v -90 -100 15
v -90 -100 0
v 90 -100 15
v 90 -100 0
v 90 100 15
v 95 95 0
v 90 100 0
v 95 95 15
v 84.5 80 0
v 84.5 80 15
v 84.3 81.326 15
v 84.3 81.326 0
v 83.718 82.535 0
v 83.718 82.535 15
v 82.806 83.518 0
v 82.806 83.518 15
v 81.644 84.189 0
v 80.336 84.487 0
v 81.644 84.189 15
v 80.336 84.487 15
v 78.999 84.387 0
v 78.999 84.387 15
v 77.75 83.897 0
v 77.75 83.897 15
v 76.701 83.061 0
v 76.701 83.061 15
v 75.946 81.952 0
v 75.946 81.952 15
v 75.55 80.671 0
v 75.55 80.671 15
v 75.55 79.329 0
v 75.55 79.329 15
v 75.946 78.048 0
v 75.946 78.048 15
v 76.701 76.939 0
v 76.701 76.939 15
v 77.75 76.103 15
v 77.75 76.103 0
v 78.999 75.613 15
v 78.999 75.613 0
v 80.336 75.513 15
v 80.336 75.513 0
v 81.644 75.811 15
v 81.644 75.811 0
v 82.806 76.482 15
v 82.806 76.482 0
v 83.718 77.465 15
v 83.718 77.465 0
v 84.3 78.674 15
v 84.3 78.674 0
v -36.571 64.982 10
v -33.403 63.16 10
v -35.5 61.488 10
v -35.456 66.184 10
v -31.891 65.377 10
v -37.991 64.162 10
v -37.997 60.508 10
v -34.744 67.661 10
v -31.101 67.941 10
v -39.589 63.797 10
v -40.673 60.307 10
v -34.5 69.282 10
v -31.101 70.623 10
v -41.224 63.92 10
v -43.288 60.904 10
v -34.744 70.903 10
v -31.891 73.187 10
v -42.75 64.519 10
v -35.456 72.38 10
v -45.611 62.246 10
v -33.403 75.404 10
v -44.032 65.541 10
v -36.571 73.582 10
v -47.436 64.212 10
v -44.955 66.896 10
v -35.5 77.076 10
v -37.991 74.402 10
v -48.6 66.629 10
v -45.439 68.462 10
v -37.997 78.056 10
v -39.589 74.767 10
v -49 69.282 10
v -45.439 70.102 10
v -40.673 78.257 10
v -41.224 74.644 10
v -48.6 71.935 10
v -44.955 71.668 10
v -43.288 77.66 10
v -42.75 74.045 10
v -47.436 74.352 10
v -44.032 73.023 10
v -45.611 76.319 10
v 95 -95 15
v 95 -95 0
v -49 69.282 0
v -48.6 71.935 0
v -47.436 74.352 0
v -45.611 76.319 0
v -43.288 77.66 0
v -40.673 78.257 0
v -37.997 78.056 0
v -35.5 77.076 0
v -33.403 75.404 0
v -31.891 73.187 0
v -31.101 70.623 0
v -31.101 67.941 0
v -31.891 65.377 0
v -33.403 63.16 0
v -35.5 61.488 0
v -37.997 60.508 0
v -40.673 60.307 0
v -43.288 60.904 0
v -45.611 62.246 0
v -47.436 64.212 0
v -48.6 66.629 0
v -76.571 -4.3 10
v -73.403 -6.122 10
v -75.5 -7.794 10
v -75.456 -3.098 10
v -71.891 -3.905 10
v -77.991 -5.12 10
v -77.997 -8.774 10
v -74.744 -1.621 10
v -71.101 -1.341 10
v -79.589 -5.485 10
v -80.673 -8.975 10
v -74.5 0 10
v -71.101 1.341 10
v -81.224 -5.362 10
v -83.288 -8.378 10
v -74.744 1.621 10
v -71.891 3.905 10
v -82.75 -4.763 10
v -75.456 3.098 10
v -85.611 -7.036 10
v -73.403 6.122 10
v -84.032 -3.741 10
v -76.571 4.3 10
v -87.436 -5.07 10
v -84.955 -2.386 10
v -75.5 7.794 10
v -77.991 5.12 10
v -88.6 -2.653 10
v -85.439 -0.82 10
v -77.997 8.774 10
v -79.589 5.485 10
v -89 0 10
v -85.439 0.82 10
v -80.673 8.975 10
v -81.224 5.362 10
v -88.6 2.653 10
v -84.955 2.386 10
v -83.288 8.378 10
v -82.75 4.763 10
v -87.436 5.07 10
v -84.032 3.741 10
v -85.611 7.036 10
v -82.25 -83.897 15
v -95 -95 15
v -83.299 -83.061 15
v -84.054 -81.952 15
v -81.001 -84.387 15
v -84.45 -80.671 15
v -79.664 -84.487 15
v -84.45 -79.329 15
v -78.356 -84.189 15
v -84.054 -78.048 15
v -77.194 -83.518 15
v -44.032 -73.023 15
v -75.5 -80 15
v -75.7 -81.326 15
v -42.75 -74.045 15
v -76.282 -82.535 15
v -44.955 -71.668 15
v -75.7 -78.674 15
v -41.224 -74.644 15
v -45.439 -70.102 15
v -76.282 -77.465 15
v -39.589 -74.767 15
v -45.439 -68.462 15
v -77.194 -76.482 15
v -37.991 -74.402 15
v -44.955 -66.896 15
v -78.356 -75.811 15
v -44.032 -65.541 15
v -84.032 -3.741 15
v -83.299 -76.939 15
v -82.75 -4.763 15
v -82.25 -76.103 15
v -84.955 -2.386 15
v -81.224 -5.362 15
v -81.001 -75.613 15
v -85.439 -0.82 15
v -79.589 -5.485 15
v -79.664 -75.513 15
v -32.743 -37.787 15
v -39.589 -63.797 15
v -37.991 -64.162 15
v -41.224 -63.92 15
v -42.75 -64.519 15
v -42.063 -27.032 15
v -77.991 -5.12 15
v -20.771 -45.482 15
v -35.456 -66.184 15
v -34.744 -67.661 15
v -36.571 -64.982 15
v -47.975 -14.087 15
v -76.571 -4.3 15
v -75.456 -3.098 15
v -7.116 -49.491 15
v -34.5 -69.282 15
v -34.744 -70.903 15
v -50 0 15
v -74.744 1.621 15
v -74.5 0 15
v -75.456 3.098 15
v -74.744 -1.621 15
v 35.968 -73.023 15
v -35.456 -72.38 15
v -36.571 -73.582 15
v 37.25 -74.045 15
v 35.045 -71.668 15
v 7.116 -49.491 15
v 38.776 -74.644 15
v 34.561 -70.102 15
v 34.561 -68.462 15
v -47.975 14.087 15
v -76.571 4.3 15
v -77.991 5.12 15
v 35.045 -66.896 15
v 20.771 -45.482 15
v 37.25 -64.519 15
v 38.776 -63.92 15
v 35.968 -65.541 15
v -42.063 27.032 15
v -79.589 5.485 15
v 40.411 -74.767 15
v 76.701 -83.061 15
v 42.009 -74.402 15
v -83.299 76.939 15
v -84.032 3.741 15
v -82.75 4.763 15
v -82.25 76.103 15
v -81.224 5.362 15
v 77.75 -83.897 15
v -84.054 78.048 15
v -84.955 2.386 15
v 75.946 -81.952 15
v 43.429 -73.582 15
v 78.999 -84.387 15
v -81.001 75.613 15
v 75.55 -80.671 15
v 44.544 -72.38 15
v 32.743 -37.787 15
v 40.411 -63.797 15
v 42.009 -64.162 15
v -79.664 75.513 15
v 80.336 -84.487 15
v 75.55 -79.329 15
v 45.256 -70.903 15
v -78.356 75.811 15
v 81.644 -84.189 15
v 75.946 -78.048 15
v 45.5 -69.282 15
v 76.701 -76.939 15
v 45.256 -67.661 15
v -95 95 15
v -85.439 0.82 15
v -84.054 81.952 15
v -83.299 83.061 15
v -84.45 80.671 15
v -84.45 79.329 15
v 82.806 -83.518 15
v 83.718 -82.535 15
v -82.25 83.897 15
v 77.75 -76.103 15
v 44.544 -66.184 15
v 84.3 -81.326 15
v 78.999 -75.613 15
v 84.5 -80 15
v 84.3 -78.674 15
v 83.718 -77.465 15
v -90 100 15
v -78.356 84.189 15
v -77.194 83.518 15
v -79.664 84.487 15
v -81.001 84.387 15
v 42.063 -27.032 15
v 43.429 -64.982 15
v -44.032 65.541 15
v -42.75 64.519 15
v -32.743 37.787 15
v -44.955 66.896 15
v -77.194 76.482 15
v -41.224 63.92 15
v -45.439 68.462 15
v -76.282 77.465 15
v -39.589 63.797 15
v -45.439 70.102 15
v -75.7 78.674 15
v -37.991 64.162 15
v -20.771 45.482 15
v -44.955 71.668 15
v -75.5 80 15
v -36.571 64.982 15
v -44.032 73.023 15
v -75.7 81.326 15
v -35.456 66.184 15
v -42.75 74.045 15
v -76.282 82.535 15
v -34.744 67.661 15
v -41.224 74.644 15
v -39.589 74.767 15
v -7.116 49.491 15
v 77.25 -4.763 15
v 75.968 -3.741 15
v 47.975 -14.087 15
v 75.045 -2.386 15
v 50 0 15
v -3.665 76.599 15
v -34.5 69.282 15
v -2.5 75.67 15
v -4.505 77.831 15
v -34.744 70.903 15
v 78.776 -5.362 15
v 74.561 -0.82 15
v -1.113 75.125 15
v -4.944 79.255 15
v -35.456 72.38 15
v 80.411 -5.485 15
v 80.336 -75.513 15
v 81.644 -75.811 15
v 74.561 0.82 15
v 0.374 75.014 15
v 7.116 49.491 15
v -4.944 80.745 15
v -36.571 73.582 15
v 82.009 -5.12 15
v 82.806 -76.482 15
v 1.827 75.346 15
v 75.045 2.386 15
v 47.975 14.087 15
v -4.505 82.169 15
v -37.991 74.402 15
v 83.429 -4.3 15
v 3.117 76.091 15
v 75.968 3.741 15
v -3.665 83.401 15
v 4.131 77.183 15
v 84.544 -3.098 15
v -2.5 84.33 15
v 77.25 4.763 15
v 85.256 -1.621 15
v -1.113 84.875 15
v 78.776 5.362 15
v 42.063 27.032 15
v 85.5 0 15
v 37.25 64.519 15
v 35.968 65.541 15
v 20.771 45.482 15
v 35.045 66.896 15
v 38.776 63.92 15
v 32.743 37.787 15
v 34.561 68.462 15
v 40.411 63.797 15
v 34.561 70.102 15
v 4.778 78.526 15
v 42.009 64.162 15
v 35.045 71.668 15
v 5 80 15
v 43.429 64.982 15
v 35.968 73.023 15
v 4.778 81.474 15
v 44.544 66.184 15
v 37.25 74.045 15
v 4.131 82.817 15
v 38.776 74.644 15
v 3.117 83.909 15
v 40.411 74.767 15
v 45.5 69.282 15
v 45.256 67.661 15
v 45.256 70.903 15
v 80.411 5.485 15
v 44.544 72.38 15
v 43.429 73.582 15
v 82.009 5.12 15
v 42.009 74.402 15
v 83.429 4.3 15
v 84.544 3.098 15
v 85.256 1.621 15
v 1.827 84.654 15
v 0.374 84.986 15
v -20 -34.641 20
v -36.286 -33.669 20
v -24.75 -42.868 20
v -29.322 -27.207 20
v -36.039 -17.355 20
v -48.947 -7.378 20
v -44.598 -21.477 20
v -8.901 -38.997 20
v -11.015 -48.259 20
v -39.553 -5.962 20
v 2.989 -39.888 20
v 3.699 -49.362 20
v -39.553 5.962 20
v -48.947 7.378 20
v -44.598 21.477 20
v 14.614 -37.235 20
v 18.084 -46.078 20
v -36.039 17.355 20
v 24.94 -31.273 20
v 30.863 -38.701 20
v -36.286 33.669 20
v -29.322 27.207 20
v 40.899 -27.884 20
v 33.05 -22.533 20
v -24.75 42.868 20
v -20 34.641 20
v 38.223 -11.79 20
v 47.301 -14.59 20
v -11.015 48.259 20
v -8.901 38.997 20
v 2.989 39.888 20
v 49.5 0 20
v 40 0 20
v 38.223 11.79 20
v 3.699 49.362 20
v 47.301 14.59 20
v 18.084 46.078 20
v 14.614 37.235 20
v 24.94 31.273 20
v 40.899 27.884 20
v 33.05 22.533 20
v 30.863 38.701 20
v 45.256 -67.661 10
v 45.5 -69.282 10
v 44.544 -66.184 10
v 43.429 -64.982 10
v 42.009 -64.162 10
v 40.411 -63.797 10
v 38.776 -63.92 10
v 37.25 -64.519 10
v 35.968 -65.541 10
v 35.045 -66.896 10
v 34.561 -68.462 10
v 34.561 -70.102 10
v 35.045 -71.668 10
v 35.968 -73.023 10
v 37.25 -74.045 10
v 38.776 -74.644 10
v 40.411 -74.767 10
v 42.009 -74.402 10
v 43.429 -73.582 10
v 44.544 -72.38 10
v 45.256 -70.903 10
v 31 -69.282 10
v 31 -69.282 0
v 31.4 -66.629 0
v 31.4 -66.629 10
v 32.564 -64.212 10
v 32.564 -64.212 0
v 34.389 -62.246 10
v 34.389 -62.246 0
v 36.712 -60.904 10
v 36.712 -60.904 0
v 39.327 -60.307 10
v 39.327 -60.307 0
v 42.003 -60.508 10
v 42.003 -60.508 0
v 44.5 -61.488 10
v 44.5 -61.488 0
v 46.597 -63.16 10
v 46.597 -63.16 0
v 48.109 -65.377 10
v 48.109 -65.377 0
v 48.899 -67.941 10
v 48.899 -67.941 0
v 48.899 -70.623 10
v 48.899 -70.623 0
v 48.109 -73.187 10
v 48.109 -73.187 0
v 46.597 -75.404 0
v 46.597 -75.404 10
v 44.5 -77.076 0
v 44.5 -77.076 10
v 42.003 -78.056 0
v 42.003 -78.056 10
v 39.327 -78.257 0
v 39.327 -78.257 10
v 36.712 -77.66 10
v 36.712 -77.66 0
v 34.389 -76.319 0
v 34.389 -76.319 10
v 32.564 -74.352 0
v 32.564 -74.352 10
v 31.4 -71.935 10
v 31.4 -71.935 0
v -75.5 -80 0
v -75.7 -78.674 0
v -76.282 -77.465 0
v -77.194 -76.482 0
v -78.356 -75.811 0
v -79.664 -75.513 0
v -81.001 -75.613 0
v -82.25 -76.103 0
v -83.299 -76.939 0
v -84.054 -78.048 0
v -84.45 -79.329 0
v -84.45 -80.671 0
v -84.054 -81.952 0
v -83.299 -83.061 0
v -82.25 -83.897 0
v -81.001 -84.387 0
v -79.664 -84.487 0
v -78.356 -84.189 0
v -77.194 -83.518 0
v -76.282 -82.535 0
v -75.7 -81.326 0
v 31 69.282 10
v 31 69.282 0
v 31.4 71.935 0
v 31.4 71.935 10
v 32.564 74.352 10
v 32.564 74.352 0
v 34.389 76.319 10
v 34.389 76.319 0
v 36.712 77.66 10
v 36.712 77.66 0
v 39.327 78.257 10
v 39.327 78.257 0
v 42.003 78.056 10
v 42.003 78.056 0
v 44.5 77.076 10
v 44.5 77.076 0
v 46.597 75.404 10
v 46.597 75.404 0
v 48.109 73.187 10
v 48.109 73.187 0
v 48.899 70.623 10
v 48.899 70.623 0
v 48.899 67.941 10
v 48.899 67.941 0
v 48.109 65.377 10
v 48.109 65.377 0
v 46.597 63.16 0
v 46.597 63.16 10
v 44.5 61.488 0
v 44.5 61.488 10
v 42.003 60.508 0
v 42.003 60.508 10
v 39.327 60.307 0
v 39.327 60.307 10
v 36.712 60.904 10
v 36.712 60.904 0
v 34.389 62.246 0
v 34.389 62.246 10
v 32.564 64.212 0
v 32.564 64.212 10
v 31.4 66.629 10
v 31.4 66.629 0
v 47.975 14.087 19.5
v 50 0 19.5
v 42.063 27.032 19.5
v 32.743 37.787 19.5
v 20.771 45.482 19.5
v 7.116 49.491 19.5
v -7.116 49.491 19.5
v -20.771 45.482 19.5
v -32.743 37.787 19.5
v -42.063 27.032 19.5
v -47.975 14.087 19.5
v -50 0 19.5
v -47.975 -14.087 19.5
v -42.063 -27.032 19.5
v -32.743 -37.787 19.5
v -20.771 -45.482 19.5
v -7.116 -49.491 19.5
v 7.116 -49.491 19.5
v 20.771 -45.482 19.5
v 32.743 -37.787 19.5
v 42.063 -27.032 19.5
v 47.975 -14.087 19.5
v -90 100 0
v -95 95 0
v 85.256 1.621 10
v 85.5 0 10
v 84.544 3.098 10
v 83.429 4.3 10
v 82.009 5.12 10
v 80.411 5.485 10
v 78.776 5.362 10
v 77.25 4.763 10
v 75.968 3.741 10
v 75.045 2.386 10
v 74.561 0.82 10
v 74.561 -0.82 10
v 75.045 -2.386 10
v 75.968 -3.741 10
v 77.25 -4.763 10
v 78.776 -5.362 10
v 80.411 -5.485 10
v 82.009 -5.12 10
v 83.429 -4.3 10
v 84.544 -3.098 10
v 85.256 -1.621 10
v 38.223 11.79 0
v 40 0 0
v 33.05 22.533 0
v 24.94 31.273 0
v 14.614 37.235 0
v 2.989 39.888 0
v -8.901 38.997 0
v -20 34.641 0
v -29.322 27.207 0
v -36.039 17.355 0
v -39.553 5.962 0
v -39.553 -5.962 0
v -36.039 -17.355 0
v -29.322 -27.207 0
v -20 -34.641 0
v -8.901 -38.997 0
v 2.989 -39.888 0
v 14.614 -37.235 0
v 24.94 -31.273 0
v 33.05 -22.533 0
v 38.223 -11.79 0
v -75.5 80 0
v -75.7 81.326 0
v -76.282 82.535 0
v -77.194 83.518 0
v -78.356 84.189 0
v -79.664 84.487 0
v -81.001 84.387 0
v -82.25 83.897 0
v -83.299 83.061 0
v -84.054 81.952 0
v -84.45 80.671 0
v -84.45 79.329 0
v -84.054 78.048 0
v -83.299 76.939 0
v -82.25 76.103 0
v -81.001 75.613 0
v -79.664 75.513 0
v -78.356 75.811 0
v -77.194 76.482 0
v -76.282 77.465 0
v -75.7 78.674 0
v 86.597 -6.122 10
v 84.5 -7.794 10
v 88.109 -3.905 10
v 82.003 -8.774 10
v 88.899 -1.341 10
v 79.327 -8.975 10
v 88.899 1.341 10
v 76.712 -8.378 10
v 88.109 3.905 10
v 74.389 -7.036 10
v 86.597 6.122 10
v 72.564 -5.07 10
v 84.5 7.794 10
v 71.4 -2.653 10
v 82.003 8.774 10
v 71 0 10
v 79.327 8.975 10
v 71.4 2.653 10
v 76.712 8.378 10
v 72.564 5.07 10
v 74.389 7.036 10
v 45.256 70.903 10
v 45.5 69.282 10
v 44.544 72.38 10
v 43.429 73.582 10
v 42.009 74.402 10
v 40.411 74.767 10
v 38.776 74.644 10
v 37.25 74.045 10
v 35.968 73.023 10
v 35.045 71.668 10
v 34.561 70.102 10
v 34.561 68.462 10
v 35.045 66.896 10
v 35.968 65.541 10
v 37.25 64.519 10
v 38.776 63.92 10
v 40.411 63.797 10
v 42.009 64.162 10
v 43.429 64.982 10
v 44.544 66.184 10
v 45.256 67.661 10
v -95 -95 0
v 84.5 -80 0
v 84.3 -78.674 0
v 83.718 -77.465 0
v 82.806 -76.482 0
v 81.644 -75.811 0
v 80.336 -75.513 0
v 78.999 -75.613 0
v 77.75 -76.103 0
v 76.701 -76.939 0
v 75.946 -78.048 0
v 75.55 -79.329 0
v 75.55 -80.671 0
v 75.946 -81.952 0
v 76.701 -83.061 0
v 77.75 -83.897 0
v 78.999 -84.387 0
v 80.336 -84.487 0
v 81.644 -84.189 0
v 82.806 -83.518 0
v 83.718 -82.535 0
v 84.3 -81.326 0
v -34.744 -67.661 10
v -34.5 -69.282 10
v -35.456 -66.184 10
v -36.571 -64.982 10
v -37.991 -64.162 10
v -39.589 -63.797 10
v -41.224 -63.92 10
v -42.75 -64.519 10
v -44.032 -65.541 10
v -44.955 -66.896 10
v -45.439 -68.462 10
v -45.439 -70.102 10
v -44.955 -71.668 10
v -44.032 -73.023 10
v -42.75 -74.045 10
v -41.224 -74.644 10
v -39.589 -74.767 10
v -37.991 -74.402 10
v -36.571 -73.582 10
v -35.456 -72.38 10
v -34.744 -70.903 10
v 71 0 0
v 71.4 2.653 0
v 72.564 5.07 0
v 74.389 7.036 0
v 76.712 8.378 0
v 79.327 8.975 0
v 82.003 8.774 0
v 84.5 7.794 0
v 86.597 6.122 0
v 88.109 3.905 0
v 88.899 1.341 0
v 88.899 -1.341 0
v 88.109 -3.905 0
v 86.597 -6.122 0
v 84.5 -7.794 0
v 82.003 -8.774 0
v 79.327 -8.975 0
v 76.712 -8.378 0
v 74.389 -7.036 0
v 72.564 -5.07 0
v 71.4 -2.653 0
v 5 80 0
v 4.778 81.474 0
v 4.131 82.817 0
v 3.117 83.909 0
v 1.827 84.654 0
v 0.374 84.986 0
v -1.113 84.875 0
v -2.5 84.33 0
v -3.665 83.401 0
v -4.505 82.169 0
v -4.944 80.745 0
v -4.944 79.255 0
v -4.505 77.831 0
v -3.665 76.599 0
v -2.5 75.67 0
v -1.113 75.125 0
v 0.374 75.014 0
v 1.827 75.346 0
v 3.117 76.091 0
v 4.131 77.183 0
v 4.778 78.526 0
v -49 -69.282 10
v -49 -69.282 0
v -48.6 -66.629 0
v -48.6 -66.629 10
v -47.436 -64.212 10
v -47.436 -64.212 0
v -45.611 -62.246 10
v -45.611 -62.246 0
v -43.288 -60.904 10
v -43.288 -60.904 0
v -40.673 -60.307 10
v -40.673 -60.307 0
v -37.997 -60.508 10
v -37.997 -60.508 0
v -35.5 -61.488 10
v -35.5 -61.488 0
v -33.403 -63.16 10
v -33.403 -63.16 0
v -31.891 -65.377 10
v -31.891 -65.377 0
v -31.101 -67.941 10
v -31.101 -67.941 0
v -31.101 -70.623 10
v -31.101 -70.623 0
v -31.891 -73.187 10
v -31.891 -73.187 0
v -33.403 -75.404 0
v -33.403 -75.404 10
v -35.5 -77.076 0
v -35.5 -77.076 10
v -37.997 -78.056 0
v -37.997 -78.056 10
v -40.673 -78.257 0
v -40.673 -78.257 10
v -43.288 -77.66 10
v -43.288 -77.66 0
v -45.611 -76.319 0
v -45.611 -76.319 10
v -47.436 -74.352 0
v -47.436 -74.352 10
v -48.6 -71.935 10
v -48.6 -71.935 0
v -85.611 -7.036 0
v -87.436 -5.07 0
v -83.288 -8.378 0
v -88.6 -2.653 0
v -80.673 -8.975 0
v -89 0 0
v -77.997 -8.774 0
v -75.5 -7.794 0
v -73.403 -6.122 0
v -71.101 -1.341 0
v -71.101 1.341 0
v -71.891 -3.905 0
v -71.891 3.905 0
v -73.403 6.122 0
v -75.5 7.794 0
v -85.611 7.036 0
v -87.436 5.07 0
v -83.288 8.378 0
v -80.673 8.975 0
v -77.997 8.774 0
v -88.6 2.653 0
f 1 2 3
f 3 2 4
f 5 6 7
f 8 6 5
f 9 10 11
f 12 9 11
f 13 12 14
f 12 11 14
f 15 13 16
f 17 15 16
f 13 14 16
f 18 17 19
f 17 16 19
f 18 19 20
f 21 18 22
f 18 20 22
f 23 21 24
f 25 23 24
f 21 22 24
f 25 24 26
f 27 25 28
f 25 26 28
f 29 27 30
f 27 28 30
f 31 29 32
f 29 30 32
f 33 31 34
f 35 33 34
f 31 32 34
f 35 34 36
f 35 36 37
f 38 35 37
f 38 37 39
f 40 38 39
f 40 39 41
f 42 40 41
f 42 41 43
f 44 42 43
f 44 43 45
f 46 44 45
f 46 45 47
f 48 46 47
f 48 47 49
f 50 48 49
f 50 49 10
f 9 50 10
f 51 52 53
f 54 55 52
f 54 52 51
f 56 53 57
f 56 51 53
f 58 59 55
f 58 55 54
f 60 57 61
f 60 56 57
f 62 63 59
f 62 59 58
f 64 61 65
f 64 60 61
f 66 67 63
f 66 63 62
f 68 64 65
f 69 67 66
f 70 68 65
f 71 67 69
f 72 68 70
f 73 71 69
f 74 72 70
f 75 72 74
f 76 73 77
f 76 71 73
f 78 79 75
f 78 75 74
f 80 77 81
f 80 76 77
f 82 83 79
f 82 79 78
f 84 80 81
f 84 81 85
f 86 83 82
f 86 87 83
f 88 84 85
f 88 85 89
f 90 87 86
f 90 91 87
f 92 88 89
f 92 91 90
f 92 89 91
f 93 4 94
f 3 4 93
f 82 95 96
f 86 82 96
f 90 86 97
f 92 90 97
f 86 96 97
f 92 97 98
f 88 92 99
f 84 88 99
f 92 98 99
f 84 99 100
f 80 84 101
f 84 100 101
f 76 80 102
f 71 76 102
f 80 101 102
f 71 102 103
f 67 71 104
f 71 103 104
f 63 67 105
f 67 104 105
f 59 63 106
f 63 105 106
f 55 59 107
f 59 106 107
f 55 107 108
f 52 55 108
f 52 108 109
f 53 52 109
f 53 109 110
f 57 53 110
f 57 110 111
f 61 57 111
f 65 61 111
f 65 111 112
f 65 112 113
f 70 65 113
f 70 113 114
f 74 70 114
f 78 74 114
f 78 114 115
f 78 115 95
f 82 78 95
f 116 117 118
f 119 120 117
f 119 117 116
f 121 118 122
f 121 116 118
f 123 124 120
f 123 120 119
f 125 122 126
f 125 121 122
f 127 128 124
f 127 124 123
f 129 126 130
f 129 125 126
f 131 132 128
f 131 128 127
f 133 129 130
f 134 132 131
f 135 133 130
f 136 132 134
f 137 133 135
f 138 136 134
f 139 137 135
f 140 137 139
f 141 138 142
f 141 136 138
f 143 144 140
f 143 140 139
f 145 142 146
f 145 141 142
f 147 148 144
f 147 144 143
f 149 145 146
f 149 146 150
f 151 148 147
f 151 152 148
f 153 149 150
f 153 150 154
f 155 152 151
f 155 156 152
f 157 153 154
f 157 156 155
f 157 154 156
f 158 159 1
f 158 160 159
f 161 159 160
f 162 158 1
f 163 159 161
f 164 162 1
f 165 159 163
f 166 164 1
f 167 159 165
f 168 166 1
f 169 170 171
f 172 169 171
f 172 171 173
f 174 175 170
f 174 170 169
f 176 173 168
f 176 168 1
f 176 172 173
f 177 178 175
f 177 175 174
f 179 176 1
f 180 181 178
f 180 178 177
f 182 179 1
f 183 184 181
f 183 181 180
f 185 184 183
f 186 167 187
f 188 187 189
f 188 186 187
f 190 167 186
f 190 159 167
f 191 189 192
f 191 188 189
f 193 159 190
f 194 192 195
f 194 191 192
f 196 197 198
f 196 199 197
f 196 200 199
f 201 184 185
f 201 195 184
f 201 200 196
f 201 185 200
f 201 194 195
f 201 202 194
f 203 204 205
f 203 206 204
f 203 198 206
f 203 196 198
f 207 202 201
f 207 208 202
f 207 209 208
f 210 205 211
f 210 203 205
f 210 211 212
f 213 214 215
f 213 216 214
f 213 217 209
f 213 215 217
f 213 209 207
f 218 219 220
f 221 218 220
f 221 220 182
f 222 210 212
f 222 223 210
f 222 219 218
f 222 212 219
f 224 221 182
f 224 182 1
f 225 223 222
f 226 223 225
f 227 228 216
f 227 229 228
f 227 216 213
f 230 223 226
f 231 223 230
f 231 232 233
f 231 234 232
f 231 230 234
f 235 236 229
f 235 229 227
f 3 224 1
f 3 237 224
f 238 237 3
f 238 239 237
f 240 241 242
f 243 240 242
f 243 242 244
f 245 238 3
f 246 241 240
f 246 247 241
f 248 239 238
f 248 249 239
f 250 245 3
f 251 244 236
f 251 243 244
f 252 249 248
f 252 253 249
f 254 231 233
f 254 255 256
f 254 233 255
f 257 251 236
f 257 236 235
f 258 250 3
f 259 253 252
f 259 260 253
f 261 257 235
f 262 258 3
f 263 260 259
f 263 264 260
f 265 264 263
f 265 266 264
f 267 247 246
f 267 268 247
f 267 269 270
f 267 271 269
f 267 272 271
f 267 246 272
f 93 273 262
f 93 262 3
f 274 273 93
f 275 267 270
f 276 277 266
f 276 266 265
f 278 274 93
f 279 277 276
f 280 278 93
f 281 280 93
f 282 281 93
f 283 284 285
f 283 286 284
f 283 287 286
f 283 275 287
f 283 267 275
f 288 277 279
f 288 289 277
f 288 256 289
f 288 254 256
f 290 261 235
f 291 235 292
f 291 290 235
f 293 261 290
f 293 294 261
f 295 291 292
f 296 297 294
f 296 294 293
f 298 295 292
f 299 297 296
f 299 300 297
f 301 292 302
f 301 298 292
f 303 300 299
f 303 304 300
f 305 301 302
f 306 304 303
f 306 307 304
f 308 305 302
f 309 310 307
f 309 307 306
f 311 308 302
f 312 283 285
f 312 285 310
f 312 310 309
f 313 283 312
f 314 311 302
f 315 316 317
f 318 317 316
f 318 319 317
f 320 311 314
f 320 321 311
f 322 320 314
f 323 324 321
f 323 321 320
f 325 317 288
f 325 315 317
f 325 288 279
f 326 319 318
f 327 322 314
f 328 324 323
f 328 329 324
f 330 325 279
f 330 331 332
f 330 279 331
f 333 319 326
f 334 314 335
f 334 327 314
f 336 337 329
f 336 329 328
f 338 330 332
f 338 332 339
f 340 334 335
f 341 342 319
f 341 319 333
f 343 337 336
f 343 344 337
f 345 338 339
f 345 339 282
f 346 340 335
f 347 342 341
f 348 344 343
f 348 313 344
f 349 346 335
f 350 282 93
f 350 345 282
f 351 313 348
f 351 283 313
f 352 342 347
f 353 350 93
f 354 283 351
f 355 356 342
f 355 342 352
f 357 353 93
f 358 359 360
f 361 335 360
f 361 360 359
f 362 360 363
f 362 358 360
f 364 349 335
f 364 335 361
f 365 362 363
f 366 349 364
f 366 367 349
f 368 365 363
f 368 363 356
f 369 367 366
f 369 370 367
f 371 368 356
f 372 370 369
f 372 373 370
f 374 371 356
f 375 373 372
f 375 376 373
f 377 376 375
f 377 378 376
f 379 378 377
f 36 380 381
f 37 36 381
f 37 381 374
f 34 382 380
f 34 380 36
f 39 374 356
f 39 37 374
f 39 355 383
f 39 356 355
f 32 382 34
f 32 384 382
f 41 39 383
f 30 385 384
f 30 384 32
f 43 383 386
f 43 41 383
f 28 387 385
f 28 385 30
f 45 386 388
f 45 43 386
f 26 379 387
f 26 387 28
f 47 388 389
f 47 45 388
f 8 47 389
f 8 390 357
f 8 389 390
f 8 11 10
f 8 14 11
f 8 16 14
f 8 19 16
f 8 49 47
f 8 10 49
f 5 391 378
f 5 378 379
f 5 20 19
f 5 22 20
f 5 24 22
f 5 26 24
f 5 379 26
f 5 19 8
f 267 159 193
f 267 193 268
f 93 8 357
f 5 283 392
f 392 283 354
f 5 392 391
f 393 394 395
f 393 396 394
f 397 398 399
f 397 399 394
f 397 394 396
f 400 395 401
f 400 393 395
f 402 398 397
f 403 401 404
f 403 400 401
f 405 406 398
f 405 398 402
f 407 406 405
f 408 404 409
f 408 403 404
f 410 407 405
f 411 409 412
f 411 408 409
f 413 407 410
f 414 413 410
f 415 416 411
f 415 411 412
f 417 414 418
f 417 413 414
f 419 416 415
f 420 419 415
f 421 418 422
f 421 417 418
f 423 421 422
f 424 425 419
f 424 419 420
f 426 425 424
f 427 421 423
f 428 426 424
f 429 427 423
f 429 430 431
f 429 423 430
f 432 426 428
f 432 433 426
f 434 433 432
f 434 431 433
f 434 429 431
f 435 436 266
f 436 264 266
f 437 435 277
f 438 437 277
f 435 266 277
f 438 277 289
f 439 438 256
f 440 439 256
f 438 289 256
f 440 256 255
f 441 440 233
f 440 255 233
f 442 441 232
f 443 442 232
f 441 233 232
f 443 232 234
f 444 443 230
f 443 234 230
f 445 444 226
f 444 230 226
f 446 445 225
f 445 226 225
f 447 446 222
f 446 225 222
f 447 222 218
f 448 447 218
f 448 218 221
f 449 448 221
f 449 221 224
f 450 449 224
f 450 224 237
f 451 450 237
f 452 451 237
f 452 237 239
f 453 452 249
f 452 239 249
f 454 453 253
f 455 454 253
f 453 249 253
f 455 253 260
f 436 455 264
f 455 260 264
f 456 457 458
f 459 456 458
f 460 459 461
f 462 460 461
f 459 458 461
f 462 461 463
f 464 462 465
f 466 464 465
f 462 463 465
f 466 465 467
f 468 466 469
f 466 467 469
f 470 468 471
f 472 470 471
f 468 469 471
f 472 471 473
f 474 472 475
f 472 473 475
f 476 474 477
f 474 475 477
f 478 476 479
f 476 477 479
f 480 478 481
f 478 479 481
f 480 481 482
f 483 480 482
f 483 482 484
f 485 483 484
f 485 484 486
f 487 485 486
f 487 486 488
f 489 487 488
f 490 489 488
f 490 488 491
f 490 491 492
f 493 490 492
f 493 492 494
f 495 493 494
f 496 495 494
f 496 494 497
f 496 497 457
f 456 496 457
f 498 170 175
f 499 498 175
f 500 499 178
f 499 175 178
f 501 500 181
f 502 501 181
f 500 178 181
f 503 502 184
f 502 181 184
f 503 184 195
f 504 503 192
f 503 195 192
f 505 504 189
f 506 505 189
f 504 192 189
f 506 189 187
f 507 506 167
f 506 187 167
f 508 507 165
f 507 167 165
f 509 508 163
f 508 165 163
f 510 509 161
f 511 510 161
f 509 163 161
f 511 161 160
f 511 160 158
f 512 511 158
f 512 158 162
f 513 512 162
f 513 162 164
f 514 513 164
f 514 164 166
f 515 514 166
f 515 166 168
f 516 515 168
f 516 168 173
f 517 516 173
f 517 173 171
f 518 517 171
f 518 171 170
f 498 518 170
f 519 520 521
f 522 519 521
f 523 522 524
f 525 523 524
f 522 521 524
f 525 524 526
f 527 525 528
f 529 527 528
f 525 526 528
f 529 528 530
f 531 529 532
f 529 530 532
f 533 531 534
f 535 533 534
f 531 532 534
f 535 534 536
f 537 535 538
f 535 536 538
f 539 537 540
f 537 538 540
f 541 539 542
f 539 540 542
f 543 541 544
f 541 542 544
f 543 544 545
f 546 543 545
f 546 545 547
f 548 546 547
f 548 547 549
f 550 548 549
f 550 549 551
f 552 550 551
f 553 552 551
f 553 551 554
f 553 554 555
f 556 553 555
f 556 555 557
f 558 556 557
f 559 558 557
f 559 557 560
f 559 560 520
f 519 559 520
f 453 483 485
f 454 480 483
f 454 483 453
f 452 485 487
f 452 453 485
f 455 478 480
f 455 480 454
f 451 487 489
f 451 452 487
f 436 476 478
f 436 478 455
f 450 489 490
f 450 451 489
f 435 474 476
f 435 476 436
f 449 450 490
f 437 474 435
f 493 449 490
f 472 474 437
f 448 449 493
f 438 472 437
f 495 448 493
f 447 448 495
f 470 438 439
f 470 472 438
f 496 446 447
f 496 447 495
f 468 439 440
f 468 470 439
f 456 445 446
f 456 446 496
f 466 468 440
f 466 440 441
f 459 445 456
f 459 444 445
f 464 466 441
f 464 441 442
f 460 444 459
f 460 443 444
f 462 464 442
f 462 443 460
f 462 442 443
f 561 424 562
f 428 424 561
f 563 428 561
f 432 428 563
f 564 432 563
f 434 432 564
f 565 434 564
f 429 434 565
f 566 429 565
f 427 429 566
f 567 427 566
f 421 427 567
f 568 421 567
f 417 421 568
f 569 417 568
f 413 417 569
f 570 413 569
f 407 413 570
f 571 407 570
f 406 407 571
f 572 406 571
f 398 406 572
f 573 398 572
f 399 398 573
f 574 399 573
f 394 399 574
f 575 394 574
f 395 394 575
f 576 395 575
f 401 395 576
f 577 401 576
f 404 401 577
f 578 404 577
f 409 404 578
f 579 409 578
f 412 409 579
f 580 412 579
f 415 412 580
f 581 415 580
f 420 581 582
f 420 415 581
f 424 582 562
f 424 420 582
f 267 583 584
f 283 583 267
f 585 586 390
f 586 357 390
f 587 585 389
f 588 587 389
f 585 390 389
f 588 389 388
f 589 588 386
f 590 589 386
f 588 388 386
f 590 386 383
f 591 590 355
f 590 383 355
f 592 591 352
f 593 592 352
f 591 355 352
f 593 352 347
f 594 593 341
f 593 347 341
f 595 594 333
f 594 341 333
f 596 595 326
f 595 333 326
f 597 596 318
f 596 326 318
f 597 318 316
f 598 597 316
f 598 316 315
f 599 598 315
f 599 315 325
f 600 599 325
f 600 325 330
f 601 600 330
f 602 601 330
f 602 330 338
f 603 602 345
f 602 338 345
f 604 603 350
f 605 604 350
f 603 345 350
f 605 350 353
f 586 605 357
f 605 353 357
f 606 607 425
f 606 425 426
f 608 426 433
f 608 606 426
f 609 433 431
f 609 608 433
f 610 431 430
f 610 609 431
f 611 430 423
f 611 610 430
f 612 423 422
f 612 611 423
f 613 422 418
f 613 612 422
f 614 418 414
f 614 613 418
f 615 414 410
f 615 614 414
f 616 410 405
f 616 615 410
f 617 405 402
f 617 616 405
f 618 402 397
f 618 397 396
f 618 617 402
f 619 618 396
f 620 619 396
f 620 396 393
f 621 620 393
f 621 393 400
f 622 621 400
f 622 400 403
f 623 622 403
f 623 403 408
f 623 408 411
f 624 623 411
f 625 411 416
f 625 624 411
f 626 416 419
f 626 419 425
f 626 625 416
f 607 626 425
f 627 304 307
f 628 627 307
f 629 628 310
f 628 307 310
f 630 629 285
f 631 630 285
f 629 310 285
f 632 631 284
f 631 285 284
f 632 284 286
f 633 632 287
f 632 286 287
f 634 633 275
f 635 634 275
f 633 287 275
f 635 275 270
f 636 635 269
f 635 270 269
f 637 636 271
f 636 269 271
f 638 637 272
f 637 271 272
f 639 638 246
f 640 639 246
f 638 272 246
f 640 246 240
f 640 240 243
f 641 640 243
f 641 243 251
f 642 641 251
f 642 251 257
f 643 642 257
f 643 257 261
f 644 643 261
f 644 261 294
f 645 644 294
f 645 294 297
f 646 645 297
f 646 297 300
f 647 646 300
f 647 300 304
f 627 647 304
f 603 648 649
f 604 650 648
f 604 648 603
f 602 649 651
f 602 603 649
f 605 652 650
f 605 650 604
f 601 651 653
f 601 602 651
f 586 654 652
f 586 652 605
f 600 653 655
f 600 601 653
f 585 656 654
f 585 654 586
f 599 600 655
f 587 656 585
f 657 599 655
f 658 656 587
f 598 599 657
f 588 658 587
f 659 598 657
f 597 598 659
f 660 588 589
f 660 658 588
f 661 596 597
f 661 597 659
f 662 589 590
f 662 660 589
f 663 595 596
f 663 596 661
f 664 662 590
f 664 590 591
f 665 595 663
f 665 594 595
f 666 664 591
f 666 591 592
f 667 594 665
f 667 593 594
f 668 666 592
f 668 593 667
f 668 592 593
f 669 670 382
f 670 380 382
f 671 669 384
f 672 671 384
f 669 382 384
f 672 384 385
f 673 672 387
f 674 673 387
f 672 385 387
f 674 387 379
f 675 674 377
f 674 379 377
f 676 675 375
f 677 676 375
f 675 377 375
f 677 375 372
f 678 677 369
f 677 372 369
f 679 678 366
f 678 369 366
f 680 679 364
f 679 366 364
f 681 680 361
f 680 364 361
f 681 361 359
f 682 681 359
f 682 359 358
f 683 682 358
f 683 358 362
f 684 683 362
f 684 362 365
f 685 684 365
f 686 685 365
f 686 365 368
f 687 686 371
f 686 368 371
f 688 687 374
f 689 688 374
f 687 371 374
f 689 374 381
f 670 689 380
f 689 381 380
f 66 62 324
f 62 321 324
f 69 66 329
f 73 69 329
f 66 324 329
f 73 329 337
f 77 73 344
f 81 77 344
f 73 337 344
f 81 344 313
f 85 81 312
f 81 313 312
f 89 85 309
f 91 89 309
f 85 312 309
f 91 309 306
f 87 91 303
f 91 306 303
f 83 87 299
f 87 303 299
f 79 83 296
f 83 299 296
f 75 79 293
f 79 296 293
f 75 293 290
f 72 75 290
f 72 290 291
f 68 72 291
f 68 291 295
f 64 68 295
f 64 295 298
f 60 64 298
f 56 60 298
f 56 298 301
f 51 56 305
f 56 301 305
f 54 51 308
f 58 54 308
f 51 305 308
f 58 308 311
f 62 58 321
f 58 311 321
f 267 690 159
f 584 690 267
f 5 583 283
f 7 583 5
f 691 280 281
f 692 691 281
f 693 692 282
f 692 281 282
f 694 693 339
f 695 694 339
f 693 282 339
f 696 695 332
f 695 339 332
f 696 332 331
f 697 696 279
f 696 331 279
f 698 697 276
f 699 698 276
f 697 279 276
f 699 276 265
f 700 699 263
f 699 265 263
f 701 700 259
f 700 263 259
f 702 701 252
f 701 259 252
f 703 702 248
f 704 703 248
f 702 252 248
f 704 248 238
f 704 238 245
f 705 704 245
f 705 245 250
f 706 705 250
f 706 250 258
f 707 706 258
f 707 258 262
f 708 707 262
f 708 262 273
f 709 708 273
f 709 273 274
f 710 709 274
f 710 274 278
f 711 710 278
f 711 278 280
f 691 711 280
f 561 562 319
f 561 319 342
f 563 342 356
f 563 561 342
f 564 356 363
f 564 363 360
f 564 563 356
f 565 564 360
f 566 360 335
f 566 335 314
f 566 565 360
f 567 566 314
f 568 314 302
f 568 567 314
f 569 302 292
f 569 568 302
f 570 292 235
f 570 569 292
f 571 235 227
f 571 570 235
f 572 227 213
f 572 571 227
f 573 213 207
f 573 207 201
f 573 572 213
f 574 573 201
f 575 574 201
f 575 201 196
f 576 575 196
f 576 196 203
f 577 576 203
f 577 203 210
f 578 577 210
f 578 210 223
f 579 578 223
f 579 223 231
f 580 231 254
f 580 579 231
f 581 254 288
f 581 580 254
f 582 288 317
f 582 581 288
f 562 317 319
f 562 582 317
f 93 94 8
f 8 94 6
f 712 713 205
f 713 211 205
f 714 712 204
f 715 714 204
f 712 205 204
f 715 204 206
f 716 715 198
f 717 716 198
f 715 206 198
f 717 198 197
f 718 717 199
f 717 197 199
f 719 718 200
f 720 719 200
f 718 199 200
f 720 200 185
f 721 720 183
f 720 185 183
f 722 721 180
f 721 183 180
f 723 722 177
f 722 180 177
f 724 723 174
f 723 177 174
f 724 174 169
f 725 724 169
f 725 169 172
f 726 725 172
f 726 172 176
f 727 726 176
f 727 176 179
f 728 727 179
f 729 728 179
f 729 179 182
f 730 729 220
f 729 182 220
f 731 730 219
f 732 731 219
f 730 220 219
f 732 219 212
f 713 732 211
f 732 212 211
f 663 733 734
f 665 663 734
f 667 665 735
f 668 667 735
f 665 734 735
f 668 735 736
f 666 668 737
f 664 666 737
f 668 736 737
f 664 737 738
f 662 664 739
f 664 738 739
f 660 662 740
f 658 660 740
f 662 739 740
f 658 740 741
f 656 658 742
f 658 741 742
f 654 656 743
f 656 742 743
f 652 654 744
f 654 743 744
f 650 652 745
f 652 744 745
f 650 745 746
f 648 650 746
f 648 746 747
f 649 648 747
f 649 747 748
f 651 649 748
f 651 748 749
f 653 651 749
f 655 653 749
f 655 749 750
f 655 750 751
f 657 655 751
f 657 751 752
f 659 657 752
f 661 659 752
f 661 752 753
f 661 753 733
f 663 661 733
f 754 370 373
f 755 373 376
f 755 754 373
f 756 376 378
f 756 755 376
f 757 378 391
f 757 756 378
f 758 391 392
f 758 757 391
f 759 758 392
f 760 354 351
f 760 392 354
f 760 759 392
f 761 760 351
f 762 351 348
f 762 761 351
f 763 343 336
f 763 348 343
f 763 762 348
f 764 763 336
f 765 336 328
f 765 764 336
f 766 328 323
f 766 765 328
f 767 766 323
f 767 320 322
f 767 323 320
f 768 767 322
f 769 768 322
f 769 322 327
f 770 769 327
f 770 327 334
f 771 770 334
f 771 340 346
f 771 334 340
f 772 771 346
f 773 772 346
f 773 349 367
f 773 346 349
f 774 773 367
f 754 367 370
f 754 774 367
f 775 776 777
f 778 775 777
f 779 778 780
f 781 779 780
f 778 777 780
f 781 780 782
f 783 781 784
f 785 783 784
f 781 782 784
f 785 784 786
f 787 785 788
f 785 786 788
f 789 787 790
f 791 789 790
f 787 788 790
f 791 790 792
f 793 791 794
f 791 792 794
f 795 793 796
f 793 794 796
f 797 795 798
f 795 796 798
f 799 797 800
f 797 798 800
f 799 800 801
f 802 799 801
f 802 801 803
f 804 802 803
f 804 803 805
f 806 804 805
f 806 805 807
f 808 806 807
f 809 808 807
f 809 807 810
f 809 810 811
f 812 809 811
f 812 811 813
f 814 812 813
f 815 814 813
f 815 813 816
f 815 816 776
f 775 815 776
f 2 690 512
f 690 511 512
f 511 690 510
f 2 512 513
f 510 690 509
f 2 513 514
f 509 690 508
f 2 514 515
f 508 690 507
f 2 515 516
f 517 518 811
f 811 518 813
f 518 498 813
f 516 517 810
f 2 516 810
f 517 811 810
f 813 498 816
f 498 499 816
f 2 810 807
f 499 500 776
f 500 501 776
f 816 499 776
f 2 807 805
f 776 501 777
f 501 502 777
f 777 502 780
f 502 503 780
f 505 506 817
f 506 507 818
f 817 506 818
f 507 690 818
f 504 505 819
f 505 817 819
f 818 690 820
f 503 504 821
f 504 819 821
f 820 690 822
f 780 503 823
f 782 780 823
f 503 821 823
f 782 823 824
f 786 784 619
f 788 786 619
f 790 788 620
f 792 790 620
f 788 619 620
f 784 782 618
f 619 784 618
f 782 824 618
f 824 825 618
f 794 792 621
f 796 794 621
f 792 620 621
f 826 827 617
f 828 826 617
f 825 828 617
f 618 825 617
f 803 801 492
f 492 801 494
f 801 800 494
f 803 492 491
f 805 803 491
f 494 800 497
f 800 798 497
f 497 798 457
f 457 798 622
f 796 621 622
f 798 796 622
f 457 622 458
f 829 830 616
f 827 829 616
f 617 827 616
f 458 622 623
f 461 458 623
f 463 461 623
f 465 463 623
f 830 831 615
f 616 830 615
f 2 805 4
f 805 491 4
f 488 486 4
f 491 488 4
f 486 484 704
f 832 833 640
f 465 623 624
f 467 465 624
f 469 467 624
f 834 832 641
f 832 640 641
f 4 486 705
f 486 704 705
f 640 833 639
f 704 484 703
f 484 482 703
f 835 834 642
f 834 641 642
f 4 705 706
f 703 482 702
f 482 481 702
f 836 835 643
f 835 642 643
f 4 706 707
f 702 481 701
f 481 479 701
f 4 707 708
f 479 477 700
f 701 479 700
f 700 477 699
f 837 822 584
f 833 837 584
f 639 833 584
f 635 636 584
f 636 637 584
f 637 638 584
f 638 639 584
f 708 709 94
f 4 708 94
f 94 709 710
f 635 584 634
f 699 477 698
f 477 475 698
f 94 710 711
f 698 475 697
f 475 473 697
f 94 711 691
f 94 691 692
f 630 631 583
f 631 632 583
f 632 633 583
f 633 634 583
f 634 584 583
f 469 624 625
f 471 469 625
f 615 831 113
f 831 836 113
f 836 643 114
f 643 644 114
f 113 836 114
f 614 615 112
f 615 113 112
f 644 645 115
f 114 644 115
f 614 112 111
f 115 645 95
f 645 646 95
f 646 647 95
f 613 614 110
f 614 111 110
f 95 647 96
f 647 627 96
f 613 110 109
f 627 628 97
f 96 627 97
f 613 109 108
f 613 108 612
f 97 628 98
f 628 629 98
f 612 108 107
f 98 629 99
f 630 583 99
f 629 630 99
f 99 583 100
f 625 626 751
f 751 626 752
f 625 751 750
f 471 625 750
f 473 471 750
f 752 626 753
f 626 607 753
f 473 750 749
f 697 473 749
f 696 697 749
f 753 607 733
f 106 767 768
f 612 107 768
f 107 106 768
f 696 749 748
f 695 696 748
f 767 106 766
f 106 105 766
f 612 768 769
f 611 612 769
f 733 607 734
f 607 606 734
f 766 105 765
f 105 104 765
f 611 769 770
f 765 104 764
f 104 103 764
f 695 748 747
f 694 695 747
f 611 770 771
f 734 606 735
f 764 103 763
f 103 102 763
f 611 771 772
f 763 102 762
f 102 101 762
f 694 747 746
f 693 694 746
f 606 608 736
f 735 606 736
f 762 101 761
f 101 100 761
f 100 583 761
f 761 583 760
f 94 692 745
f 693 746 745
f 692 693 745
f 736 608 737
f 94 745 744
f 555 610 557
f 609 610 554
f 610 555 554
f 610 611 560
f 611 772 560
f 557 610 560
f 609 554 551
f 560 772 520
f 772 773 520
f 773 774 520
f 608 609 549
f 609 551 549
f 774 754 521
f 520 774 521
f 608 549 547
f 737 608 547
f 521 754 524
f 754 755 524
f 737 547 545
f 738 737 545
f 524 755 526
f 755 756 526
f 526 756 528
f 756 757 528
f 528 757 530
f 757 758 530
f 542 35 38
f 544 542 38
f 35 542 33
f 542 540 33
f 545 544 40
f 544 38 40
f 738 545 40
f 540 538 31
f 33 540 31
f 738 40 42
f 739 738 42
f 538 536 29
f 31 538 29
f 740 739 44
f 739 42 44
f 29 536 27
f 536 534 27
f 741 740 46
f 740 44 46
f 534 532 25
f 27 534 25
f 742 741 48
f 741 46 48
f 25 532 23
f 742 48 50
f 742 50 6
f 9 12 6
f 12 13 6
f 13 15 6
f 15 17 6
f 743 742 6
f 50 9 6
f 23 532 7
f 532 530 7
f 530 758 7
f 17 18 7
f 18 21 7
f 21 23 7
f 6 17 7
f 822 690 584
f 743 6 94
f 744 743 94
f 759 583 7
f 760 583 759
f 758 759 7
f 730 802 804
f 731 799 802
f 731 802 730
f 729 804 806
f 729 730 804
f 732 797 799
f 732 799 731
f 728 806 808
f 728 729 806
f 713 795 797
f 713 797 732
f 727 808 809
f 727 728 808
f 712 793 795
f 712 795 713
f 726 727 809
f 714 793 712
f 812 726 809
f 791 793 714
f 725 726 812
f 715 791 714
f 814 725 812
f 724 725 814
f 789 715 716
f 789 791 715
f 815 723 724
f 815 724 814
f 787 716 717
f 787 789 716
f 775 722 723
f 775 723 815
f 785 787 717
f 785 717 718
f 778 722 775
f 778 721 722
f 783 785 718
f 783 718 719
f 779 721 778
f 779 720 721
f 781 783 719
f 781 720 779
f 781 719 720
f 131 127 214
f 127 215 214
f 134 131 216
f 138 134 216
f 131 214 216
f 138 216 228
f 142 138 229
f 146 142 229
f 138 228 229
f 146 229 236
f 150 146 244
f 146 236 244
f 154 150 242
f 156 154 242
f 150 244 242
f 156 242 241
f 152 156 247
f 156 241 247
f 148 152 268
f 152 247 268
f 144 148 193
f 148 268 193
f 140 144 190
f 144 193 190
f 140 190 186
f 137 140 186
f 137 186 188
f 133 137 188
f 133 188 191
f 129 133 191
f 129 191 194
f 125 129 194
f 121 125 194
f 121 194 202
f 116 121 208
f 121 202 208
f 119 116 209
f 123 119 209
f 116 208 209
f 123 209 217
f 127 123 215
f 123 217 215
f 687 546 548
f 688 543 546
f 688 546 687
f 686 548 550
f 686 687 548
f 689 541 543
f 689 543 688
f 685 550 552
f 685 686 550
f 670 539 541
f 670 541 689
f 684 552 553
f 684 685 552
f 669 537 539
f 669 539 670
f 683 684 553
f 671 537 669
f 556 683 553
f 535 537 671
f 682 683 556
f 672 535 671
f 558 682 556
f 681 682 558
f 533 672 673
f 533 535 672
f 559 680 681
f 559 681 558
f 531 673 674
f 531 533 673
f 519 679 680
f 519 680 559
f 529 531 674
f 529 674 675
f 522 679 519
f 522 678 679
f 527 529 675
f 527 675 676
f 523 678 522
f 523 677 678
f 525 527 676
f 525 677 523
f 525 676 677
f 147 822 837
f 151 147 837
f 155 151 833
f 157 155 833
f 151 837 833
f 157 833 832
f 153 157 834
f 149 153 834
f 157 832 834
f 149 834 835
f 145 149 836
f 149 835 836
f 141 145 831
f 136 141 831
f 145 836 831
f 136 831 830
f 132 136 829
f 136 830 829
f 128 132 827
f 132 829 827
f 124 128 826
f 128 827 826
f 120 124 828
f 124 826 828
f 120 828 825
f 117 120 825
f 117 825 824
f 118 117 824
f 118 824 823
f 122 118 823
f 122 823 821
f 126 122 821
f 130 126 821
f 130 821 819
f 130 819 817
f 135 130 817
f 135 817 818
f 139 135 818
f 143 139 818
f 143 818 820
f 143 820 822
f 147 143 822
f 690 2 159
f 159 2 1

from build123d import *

# Parameters (mm, degrees)
CROQUIS1_W                                           = 190
CROQUIS1_H                                           = 200
CROQUIS1_R                                           = 5
CROQUIS1_R_2                                         = 40
SALIENTE_EXTRUIR1_DEPTH                              = 20
CROQUIS2_OUTSIDE_W                                   = 247.318
CROQUIS2_OUTSIDE_H                                   = 257.318
CROQUIS2_OUTSIDE_R                                   = 50
CORTAR_EXTRUIR1_DEPTH                                = 5
CHAFL_N1_SIZE                                        = 0.5
CHAFL_N2_SIZE                                        = 5
CORTAR_EXTRUIR2_DEPTH                                = 139.744369255
CORTAR_EXTRUIR2_DEPTH_BACK                           = 139.744369255
CROQUIS3_R                                           = 4.375
REFRENTADO_PARA_TORNILLO_TAP_N_CON_CABEZ_D           = 11
REFRENTADO_PARA_TORNILLO_TAP_N_CON_CABEZ_CBORE_D     = 18
REFRENTADO_PARA_TORNILLO_TAP_N_CON_CABEZ_CBORE_DEPTH = 10
TALADRO_ROSCADO_M10X1_01_D                           = 9


with BuildPart() as part:
    # Croquis1 → Saliente-Extruir1 (new body)
    with BuildSketch(Plane.XY):
        Rectangle(CROQUIS1_W, CROQUIS1_H)
        with Locations((80, 0)):
            Circle(CROQUIS1_R, mode=Mode.SUBTRACT)
        with Locations((40, -69.282032303)):
            Circle(CROQUIS1_R, mode=Mode.SUBTRACT)
        with Locations((-40, -69.282032303)):
            Circle(CROQUIS1_R, mode=Mode.SUBTRACT)
        with Locations((-80, 0)):
            Circle(CROQUIS1_R, mode=Mode.SUBTRACT)
        with Locations((-40, 69.282032303)):
            Circle(CROQUIS1_R, mode=Mode.SUBTRACT)
        with Locations((40, 69.282032303)):
            Circle(CROQUIS1_R, mode=Mode.SUBTRACT)
        with Locations((0, 80)):
            Circle(CROQUIS1_R, mode=Mode.SUBTRACT)
        Circle(CROQUIS1_R_2, mode=Mode.SUBTRACT)
    extrude(amount=SALIENTE_EXTRUIR1_DEPTH)

    # Croquis2 outside → Cortar-Extruir1 (cut)
    with BuildSketch(Plane.XY.offset(20)):
        Rectangle(CROQUIS2_OUTSIDE_W, CROQUIS2_OUTSIDE_H)
        Circle(CROQUIS2_OUTSIDE_R, mode=Mode.SUBTRACT)
    extrude(amount=-CORTAR_EXTRUIR1_DEPTH, mode=Mode.SUBTRACT)

    # Chaflán1
    chafl_n1_edges = [part.edges().sort_by_distance(p)[0] for p in [
        (-50, 0, 20),
    ]]
    chamfer(chafl_n1_edges, length=CHAFL_N1_SIZE)

    # Chaflán2
    chafl_n2_edges = [part.edges().sort_by_distance(p)[0] for p in [
        (95, -100, 7.5),
        (-95, -100, 7.5),
        (-95, 100, 7.5),
        (95, 100, 7.5),
    ]]
    chamfer(chafl_n2_edges, length=CHAFL_N2_SIZE)

    # Croquis3 → Cortar-Extruir2 (cut, two sides: drawn at the far end of the back side and taken through both)
    with BuildSketch(Plane.XY.offset(15).offset(-CORTAR_EXTRUIR2_DEPTH_BACK)):
        with Locations((-80, 80)):
            Circle(CROQUIS3_R)
        with Locations((80, 80)):
            Circle(CROQUIS3_R)
        with Locations((80, -80)):
            Circle(CROQUIS3_R)
        with Locations((-80, -80)):
            Circle(CROQUIS3_R)
    extrude(amount=CORTAR_EXTRUIR2_DEPTH + CORTAR_EXTRUIR2_DEPTH_BACK, mode=Mode.SUBTRACT)

    # Refrentado para tornillo tapón con cabeza de clavija de M101 (through all)
    with Locations(Plane(origin=(40, 69.282032303, 0), x_dir=(-1, 0, 0), z_dir=(0, 0, -1))):
        with Locations((0, 0), (-40, -69.282032303), (120, -69.282032303), (80, -138.564064606), (0, -138.564064606), (80, 0)):
            CounterBoreHole(REFRENTADO_PARA_TORNILLO_TAP_N_CON_CABEZ_D / 2, REFRENTADO_PARA_TORNILLO_TAP_N_CON_CABEZ_CBORE_D / 2, REFRENTADO_PARA_TORNILLO_TAP_N_CON_CABEZ_CBORE_DEPTH)

    # Taladro roscado M10x1.01 (through all)
    with Locations(Plane(origin=(0, 0, 0), x_dir=(-1, 0, 0), z_dir=(0, 0, -1))):
        with Locations((-80, 80), (80, 80), (-80, -80), (80, -80)):
            Hole(TALADRO_ROSCADO_M10X1_01_D / 2)


solid = part.part
